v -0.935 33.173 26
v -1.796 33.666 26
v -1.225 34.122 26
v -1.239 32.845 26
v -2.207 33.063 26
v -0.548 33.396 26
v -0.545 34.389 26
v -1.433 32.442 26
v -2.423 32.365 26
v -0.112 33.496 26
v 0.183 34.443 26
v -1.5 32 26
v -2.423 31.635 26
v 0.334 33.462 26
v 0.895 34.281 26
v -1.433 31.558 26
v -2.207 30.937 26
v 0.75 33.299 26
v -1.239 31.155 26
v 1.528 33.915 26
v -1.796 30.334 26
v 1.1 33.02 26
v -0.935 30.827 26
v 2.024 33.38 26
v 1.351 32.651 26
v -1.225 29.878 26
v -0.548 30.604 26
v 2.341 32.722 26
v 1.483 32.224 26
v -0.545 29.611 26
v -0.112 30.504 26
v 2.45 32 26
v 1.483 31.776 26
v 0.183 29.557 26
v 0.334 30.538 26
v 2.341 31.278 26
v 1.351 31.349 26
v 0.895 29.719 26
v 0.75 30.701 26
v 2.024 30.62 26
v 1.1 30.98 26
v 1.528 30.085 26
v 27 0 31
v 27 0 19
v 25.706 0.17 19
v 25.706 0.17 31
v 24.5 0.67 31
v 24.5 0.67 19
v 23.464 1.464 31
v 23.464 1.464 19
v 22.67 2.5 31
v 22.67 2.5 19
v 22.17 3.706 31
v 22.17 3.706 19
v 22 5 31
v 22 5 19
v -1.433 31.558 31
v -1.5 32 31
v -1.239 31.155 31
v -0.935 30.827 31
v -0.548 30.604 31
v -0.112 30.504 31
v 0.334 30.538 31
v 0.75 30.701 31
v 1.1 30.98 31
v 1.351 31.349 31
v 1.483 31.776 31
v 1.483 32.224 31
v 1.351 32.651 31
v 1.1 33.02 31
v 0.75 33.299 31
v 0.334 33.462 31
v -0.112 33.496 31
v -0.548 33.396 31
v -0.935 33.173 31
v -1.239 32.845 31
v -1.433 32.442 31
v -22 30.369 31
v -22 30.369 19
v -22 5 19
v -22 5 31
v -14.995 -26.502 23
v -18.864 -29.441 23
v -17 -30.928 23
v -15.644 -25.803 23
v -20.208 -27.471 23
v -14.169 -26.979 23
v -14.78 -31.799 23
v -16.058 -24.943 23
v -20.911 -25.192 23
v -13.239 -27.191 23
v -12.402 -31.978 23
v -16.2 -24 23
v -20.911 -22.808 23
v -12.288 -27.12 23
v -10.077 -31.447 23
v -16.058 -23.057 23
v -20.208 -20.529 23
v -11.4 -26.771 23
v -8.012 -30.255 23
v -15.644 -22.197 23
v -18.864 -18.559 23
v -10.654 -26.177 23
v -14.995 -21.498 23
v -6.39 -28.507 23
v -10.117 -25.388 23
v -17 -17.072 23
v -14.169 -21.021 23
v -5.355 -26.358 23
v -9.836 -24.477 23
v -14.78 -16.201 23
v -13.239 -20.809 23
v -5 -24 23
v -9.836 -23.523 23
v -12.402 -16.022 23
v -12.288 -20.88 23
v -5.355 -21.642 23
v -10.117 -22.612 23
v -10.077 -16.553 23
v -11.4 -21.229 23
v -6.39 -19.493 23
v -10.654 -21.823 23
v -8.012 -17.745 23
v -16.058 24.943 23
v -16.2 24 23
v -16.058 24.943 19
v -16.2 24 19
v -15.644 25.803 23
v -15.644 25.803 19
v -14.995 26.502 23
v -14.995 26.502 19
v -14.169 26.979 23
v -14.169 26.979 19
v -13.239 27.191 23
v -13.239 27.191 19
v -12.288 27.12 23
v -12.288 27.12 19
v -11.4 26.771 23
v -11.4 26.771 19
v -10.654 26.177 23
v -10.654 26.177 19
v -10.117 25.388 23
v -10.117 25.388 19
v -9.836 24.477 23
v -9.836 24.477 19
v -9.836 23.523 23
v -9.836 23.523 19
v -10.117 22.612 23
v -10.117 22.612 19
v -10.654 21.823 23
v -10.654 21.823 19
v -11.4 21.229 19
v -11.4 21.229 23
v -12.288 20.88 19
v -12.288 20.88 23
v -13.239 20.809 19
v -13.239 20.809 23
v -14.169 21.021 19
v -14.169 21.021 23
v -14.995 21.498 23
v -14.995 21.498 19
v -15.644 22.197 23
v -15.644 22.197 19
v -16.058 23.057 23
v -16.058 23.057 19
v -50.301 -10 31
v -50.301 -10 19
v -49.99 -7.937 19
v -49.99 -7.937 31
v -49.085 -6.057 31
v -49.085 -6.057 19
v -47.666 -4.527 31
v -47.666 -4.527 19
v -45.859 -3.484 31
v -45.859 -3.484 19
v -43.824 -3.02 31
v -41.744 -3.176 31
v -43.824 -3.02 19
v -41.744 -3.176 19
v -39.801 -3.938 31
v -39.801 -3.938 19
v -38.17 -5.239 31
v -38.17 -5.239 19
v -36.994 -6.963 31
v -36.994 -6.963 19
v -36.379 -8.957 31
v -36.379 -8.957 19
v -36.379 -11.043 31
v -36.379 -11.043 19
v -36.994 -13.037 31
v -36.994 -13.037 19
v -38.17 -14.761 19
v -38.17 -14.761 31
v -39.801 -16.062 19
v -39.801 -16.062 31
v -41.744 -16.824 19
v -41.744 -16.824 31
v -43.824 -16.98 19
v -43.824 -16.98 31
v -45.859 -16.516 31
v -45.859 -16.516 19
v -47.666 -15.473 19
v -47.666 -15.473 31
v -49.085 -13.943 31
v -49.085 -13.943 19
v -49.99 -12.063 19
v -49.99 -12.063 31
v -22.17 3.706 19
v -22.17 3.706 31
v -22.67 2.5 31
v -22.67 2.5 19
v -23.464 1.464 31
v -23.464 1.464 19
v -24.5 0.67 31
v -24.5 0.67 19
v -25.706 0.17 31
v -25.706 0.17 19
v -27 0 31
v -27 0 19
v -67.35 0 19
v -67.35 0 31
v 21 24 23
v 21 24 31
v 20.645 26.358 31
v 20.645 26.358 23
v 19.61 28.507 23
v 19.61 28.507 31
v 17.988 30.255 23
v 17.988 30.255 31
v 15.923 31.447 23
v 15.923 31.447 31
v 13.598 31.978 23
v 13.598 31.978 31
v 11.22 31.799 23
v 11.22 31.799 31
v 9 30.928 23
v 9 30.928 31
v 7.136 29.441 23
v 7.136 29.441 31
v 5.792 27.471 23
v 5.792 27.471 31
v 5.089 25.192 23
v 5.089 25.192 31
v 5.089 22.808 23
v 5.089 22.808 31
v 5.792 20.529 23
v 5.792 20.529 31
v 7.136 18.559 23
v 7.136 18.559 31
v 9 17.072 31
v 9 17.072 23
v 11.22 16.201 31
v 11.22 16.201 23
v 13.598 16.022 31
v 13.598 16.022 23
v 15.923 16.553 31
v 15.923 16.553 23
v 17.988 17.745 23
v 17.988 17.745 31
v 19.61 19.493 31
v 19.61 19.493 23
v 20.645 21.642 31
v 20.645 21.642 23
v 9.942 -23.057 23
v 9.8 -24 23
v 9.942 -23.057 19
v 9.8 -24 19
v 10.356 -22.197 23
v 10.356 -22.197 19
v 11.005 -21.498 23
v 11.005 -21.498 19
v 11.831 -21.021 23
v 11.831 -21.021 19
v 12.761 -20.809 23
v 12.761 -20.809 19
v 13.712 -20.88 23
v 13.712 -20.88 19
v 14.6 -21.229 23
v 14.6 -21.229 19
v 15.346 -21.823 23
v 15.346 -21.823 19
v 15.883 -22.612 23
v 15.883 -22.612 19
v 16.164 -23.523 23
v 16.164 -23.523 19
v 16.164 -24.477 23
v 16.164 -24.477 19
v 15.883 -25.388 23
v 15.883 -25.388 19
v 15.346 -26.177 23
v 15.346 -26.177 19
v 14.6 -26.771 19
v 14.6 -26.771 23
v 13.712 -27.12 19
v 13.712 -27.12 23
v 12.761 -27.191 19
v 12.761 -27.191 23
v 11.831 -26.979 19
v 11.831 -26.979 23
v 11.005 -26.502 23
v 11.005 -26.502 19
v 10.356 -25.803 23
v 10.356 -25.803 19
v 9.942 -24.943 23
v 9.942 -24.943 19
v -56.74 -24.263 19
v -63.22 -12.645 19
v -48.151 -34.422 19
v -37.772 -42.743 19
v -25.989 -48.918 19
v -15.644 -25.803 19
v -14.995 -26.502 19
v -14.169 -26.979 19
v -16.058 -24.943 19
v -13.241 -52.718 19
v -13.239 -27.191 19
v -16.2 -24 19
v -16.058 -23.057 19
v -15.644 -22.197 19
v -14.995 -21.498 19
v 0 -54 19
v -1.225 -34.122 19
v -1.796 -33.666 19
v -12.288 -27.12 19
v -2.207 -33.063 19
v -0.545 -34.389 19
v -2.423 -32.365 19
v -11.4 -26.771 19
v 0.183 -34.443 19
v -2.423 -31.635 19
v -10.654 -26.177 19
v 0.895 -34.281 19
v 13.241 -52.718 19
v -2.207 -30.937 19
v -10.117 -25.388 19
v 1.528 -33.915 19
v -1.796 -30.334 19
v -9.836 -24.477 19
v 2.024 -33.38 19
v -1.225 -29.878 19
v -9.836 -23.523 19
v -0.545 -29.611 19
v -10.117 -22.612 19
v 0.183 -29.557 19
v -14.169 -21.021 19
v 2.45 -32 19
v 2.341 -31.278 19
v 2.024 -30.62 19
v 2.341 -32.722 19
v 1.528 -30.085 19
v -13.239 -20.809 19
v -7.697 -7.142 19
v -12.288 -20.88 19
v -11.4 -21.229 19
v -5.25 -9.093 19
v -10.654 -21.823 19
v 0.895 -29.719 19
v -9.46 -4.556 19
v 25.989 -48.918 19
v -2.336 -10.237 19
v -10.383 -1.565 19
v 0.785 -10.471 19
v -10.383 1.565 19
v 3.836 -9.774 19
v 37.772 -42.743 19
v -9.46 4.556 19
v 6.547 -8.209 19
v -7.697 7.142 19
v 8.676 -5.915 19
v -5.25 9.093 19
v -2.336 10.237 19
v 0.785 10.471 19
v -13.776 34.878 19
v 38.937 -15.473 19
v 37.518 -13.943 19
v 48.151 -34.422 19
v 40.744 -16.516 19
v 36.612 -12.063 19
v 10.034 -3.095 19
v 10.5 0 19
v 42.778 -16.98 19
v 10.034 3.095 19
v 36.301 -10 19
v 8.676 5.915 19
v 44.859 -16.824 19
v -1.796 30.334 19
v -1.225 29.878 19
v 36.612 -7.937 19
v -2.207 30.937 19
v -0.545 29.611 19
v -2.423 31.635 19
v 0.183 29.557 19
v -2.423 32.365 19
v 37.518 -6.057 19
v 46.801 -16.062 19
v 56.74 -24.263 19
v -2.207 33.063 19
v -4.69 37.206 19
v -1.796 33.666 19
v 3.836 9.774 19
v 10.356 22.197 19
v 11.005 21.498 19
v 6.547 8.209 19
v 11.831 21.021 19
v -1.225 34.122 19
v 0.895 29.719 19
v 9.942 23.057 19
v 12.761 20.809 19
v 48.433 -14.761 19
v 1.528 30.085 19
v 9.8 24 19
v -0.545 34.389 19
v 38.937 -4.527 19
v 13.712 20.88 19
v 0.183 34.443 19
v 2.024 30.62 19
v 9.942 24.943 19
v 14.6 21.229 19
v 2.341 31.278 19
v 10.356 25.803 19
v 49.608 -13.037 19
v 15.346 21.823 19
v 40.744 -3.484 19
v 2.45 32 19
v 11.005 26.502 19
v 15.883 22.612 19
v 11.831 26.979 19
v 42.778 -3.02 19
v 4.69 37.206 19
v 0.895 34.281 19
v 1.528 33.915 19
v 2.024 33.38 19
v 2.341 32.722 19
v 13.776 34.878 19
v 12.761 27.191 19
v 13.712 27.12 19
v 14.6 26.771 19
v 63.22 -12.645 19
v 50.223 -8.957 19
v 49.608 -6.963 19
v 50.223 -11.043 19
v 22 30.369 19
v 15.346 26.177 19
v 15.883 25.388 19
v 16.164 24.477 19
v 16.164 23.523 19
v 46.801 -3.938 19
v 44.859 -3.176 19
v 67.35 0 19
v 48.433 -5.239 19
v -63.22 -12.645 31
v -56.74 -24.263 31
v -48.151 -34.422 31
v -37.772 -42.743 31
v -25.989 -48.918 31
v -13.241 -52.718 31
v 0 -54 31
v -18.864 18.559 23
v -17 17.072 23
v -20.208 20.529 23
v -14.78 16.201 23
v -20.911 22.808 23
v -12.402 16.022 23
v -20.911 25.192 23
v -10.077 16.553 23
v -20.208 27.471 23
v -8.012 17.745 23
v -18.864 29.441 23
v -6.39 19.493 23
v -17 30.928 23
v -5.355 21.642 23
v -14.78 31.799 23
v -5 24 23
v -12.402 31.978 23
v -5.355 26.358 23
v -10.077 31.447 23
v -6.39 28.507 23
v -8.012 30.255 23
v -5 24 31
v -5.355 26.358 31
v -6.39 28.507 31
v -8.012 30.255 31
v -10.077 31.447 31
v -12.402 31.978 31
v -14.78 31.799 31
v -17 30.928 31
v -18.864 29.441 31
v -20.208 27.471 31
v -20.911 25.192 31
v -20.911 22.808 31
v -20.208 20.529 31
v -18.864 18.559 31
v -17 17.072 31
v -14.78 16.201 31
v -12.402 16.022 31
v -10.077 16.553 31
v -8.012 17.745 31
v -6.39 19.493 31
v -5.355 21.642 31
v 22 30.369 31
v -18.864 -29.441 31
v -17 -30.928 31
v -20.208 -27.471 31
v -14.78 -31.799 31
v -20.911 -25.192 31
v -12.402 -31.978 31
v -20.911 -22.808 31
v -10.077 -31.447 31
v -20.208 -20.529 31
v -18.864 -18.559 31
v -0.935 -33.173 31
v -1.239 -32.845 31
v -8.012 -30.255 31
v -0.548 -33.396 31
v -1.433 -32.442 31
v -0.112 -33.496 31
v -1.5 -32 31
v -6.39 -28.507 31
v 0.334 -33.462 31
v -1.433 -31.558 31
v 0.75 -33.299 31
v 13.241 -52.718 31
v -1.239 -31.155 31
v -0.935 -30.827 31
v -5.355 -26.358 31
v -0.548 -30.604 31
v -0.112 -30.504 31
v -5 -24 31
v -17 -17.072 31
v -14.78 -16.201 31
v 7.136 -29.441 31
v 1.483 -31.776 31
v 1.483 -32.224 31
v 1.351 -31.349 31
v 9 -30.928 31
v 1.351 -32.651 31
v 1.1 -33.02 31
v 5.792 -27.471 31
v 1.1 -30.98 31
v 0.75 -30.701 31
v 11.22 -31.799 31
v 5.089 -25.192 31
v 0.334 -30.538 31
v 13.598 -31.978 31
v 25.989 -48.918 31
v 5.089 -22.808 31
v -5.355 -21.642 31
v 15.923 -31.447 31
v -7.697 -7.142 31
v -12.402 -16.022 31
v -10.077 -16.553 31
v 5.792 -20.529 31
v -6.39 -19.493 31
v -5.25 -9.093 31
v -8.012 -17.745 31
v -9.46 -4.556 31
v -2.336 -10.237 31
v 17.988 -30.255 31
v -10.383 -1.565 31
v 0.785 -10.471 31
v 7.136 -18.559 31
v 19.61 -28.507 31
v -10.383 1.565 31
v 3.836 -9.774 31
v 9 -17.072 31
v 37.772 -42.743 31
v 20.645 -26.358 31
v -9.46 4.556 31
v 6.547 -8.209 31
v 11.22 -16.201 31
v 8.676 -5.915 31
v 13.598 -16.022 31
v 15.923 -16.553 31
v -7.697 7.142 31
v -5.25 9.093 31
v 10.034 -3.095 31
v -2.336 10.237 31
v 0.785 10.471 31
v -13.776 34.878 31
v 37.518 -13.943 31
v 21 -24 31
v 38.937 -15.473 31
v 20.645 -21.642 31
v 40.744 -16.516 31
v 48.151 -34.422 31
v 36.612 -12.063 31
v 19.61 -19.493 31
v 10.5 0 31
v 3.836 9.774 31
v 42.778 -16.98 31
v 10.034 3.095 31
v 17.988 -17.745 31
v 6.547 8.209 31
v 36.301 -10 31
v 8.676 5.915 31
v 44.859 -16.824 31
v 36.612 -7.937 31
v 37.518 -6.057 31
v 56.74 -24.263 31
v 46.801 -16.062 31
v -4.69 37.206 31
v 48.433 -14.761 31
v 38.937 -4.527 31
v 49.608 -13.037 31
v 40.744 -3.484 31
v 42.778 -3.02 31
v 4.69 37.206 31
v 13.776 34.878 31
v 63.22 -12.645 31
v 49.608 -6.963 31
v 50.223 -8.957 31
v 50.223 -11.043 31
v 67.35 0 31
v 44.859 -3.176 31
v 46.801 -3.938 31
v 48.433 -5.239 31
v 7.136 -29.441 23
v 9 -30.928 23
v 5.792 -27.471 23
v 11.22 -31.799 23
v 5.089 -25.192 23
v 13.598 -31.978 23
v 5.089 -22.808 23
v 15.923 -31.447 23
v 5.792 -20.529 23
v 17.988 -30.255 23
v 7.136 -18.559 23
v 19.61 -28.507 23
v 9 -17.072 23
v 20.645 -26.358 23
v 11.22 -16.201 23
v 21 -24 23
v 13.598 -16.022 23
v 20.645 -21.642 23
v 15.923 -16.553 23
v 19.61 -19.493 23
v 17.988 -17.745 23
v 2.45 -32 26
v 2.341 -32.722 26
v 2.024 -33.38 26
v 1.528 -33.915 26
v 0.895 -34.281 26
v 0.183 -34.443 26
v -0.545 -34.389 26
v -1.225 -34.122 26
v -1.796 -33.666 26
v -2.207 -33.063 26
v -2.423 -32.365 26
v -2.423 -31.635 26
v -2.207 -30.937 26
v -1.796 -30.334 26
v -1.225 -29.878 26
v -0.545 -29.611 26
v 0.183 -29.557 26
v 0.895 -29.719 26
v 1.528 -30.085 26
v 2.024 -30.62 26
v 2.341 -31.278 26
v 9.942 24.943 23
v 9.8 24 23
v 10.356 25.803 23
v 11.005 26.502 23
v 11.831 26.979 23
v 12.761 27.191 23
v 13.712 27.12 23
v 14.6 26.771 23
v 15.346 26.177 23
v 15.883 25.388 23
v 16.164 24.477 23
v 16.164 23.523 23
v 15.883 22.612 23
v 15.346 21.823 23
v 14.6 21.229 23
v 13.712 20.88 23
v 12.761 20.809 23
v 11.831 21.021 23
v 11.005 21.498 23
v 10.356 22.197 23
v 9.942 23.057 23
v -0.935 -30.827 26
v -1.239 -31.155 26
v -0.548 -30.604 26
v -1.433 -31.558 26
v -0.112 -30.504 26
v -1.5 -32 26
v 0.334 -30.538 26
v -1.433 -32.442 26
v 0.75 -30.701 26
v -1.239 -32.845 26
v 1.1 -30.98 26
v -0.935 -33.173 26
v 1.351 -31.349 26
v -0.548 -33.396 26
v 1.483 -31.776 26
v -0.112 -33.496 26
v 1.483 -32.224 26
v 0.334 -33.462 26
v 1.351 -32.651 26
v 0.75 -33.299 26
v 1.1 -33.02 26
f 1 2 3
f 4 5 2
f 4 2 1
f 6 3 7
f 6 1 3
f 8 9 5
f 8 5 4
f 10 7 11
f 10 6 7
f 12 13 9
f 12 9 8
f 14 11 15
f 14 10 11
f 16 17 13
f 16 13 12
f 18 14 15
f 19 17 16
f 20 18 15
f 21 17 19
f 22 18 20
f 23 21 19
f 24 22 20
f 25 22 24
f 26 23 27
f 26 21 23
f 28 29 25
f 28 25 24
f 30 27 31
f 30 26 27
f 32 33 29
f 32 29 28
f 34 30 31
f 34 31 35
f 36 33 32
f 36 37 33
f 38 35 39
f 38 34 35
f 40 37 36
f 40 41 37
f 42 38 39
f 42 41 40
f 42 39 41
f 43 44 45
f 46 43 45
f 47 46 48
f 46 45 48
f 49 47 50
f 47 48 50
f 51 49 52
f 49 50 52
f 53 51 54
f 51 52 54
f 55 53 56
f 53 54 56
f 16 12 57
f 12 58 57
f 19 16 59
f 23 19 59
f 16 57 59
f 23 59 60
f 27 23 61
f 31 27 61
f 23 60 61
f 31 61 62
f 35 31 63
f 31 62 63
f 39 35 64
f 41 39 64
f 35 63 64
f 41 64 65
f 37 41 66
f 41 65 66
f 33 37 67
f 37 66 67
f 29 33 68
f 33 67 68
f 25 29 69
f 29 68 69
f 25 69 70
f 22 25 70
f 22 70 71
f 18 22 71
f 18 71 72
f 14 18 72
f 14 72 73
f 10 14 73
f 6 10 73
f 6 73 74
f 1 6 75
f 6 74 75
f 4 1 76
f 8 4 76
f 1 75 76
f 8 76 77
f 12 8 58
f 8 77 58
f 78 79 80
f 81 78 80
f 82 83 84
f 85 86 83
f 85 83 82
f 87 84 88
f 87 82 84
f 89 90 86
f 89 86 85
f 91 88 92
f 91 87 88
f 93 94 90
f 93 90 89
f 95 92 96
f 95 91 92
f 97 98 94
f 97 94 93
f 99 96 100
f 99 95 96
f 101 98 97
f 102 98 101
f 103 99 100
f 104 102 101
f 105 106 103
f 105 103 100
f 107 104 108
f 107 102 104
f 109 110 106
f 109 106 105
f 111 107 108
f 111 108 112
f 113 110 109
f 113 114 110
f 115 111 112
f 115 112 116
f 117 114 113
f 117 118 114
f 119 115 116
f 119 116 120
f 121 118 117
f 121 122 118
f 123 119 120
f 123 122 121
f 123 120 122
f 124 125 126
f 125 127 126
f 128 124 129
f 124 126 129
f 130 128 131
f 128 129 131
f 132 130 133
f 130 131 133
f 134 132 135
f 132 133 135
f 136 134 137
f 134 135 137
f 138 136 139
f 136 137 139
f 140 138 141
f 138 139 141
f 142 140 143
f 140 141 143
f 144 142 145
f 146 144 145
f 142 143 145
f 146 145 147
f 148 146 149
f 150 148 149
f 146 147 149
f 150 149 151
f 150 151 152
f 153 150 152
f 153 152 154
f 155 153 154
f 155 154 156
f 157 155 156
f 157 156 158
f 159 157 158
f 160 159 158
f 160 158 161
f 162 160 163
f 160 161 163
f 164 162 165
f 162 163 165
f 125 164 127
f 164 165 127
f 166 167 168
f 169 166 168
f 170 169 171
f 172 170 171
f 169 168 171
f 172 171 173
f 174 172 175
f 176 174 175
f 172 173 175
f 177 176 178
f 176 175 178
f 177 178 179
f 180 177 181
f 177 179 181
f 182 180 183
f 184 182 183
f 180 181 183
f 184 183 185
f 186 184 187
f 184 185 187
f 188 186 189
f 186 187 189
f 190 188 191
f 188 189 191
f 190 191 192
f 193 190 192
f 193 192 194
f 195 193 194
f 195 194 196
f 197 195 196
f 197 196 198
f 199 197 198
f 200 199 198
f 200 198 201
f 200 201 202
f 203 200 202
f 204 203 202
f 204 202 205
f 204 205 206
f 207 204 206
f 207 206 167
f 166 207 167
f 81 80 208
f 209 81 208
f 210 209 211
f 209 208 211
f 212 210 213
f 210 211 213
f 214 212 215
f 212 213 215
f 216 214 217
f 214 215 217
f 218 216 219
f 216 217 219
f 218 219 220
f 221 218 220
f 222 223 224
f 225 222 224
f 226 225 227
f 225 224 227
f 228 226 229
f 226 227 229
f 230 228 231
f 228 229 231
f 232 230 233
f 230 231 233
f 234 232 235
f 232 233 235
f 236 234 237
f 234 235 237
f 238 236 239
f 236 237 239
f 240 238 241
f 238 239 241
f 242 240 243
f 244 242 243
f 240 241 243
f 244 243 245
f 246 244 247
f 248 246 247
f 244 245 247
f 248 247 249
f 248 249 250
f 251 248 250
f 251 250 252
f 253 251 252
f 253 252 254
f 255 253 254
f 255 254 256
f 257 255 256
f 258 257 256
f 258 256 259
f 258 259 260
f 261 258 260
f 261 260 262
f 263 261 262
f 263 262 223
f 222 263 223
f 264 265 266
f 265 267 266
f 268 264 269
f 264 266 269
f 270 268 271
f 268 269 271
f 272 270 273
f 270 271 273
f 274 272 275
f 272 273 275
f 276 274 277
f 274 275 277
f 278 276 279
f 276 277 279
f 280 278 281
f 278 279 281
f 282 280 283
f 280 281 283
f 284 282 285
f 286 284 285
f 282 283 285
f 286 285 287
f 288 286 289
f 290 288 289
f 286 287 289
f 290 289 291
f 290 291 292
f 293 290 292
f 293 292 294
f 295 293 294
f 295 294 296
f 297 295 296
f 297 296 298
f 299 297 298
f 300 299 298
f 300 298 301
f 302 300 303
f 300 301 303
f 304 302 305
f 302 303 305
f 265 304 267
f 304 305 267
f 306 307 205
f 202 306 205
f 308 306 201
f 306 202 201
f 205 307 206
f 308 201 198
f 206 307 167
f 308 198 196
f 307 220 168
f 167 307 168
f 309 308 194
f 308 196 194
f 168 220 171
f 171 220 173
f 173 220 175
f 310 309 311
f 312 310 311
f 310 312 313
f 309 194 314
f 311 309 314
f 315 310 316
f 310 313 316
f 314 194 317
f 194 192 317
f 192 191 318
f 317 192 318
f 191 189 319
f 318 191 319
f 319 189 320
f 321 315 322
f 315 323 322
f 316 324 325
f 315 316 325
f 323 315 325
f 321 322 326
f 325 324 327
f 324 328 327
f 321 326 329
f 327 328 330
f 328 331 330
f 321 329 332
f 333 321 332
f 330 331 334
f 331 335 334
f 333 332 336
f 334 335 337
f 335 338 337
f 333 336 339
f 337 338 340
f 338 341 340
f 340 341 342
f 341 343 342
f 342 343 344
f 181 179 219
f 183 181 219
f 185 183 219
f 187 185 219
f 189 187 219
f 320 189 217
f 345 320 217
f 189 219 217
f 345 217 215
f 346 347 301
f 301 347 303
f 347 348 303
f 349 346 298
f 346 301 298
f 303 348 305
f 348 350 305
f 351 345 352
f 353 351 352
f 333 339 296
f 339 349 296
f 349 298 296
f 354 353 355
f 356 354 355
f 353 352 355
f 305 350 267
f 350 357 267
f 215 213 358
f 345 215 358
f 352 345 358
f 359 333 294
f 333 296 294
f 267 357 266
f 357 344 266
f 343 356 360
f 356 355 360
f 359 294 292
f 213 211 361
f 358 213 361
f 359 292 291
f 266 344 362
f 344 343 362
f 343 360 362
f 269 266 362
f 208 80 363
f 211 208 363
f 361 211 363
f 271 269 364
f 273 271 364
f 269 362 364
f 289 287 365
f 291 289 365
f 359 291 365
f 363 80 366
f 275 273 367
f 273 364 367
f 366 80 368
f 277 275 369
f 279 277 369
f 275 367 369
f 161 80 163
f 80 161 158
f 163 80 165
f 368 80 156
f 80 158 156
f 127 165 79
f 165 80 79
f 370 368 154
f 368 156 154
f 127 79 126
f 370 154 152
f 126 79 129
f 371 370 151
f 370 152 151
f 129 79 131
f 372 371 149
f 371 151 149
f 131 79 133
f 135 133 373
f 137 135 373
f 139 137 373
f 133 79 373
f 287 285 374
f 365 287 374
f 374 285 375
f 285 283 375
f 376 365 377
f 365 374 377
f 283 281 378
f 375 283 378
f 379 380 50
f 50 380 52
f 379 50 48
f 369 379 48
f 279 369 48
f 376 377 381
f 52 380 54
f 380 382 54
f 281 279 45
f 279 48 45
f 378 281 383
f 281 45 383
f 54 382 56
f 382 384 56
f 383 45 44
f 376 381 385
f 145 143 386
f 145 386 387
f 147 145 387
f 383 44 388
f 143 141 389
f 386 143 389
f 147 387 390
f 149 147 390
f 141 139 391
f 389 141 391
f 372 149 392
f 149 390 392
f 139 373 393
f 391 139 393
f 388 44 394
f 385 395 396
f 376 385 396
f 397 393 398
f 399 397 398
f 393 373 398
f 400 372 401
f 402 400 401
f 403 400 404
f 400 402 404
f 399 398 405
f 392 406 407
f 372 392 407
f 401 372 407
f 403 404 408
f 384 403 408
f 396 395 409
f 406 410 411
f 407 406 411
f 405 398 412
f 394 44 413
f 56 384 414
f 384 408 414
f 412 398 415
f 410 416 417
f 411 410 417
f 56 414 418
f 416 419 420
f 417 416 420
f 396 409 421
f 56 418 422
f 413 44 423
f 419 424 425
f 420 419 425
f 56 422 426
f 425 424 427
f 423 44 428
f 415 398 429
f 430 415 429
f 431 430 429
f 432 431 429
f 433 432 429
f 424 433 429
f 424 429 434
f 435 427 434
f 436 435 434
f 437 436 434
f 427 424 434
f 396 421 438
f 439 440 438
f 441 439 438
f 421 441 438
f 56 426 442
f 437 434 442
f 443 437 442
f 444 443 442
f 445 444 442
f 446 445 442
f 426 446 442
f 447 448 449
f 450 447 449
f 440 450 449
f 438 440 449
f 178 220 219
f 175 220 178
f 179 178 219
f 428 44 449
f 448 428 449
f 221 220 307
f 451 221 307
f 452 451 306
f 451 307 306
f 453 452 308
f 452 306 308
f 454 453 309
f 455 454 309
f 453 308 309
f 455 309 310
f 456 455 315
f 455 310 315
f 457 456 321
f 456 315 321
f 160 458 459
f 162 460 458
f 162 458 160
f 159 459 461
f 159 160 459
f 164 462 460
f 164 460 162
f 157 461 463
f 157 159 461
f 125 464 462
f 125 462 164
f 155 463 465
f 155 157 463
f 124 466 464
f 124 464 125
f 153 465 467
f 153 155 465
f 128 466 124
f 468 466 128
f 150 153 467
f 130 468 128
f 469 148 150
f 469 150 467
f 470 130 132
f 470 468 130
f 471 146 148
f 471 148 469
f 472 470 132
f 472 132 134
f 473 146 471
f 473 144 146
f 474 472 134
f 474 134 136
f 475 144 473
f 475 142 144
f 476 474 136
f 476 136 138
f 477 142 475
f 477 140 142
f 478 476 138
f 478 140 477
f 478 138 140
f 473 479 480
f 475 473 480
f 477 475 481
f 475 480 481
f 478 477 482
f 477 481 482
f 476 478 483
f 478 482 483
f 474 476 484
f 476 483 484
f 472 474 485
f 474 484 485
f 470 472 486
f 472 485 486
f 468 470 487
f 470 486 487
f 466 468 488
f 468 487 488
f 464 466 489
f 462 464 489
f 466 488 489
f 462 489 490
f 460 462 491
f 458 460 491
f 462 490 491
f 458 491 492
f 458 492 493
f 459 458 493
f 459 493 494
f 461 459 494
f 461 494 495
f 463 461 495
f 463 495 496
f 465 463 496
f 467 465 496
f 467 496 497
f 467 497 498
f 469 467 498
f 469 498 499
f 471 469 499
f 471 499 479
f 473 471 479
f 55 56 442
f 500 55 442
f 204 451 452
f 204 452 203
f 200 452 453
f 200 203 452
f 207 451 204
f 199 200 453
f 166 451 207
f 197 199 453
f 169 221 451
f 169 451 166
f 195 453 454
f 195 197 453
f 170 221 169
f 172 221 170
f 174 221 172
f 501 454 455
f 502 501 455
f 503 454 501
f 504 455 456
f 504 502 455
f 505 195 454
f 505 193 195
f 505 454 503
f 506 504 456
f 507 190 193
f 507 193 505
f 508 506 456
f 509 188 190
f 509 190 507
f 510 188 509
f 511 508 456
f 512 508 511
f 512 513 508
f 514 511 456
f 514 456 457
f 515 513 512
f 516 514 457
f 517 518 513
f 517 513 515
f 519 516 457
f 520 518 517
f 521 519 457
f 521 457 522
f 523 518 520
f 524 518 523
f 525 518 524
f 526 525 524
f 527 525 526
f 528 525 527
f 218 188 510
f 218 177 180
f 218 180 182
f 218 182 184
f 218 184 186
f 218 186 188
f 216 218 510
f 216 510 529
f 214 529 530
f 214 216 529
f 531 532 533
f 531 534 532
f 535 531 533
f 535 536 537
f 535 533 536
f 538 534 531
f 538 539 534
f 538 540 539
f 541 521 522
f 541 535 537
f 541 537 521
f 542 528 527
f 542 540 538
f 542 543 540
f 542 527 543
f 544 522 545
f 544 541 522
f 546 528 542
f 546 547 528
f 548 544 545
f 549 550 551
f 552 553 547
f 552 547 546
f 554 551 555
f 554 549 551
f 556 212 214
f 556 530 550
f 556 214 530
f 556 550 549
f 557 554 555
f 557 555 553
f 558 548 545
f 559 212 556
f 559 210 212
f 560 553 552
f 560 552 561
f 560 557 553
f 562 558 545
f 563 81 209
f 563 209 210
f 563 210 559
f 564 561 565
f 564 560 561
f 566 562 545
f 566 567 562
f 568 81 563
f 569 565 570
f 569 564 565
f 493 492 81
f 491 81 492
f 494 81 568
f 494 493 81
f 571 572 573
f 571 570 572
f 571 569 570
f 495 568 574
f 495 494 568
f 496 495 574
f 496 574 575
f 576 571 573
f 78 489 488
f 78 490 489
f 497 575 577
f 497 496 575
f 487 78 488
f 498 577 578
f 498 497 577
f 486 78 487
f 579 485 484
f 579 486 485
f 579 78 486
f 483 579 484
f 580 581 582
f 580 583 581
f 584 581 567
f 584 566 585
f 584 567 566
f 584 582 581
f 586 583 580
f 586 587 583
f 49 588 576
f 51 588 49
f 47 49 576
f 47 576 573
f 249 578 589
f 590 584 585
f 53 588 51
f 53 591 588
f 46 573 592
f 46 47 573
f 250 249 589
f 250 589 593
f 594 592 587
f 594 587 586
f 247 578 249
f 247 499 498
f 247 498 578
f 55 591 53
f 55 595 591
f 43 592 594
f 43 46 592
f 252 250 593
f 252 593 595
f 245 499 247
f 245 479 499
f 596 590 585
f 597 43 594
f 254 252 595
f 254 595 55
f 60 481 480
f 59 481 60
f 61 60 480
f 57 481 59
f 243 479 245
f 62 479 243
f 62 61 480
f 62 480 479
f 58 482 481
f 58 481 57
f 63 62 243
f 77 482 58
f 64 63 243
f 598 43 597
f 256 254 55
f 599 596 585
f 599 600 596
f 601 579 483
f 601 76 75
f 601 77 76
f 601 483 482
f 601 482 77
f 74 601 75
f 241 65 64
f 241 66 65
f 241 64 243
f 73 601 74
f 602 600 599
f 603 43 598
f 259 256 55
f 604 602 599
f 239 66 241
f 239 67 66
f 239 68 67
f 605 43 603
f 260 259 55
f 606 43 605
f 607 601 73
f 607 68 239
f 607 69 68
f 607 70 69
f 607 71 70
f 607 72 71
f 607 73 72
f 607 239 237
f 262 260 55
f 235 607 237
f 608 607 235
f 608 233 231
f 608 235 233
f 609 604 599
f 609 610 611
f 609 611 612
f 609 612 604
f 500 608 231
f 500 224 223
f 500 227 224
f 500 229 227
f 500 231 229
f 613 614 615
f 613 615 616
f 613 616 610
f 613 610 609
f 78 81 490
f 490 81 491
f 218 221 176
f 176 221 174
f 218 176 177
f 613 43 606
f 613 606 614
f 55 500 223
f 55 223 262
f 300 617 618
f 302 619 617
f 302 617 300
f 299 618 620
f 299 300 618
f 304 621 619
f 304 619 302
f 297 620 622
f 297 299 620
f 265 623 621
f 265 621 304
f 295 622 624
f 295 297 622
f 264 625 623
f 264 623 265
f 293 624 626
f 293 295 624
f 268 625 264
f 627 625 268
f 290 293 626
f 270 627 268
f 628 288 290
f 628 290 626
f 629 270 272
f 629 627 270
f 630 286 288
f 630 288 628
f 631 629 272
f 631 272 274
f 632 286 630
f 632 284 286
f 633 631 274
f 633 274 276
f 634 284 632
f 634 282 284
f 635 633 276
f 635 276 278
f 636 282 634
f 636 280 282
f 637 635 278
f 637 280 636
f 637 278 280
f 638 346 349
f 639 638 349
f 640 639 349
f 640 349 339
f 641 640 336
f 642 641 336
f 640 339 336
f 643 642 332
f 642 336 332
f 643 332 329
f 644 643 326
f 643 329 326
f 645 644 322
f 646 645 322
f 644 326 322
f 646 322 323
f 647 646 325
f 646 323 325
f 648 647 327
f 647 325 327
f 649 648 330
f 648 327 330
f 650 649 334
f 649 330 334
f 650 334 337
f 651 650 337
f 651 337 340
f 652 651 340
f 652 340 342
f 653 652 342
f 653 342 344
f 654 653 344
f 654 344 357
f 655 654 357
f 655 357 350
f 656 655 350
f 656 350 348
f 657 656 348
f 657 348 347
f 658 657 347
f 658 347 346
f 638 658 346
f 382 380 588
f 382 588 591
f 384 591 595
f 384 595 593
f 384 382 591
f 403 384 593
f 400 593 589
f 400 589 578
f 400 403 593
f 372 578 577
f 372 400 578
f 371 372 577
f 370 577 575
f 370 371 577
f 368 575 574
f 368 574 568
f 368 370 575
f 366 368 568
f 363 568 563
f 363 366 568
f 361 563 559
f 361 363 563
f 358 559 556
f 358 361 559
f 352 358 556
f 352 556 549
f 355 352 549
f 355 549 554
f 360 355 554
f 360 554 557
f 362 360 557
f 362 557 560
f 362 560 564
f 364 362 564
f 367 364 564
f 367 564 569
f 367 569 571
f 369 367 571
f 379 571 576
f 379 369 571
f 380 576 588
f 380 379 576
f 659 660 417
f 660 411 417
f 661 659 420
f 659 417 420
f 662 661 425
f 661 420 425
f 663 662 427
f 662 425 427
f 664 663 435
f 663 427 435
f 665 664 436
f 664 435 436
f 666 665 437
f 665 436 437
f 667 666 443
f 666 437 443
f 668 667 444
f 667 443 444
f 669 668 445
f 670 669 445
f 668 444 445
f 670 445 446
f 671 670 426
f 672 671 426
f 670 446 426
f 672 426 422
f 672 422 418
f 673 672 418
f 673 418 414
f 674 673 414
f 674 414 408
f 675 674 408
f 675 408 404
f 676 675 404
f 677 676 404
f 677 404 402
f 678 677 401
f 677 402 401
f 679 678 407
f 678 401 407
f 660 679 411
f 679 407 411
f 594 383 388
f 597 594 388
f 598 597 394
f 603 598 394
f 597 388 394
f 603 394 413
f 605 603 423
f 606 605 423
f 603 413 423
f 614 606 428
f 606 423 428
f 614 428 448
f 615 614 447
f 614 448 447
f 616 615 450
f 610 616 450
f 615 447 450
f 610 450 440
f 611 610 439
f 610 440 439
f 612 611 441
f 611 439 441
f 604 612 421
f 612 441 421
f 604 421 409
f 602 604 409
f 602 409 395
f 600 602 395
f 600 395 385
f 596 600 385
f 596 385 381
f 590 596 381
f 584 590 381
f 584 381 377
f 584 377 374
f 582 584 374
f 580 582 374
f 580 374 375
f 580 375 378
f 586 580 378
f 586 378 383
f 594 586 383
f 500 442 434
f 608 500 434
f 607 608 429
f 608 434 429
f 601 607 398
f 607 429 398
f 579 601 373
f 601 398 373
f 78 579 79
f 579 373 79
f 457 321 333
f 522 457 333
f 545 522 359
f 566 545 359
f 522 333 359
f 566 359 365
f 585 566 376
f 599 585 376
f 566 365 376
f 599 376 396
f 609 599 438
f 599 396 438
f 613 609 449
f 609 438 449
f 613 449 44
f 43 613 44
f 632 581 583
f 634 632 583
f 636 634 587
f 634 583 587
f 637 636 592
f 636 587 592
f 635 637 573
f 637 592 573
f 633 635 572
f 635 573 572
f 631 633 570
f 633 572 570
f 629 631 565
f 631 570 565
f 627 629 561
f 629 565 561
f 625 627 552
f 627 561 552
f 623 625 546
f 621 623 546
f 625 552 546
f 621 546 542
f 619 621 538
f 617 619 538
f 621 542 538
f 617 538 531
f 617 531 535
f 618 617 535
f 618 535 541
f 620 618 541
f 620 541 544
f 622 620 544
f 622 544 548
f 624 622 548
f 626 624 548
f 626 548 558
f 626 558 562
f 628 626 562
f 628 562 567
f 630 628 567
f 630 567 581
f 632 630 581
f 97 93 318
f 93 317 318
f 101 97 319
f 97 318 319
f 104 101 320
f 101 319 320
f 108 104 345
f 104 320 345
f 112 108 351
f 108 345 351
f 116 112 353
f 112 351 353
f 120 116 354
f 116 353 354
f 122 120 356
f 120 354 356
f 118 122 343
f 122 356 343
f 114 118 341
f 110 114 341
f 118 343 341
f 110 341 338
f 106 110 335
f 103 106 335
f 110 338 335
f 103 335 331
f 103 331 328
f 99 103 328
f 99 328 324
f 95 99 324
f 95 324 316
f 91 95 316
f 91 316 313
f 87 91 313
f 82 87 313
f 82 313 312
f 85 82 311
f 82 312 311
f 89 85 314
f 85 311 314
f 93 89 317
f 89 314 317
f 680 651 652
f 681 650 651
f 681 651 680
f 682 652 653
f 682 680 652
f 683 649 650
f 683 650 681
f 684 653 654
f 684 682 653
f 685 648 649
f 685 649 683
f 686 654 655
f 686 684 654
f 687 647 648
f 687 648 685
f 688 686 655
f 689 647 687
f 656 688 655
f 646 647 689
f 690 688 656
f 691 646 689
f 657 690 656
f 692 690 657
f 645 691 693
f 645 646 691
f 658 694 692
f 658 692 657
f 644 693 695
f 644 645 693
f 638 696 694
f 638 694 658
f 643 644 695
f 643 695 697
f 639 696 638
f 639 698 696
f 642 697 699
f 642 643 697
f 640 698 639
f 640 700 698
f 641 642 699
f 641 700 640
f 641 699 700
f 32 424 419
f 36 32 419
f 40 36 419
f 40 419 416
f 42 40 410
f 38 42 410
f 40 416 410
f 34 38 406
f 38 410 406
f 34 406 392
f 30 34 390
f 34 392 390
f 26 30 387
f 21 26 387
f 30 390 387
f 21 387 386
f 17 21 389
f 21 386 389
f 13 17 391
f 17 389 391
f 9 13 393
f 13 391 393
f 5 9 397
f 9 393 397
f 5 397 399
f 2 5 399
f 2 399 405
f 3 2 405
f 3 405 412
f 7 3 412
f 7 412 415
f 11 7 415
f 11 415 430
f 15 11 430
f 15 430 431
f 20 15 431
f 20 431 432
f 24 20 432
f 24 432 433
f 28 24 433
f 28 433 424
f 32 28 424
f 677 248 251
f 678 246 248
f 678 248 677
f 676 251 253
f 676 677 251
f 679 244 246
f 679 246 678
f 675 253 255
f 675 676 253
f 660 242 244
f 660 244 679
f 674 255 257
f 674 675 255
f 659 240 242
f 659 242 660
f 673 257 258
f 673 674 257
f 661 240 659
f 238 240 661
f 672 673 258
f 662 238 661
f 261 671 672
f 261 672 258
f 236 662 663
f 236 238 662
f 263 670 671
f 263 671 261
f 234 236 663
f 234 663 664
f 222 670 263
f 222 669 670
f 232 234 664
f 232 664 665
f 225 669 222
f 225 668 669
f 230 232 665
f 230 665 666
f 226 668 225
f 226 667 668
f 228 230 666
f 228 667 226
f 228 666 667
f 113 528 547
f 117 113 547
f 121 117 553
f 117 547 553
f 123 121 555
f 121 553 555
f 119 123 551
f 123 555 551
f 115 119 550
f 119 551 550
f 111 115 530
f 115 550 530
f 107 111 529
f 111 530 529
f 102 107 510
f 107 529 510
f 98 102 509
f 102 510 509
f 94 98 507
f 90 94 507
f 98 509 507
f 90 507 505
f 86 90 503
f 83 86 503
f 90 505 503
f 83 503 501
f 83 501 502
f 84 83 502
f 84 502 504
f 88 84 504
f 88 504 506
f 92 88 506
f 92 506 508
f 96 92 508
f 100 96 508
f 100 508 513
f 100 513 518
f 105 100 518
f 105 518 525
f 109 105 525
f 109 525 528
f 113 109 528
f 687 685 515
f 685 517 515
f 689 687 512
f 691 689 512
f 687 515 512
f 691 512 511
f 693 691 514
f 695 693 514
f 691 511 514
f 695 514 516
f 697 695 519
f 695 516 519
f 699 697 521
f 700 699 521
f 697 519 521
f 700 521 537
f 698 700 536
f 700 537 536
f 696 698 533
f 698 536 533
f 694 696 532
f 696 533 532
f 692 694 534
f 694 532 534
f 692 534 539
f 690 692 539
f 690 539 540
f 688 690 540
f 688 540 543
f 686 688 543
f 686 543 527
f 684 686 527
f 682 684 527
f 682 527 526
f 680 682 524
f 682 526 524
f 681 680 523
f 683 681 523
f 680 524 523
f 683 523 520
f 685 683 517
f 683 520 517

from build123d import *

# Parameters (mm, degrees)
F1_R           = 10.5
F2_DEPTH       = 12
F6_D           = 6.4
F6_CBORE_D     = 16
F6_CBORE_DEPTH = 8
F7_D           = 14
F9_D           = 3
F9_CBORE_D     = 4.9
F9_CBORE_DEPTH = 7


with BuildPart() as f2:
    # F1 (on offset) → F2 (new body)
    with BuildSketch(Plane.XY.offset(19)):
        with BuildLine():
            ThreePointArc((22, 30.3685692781), (0, 37.5), (-22, 30.3685692781))
            Line((-22, 30.3685692781), (-22, 5))
            ThreePointArc((-22, 5), (-23.4644660941, 1.4644660941), (-27, 0))
            Line((-27, 0), (-67.3498329619, 0))
            ThreePointArc((-67.3498329619, 0), (-43.1624837098, -38.8330753348), (0, -54))
            ThreePointArc((0, -54), (43.1624837098, -38.8330753348), (67.3498329619, 0))
            Line((67.3498329619, 0), (27, 0))
            ThreePointArc((27, 0), (23.4644660941, 1.4644660941), (22, 5))
            Line((22, 5), (22, 30.3685692781))
        make_face()
        Circle(F1_R, mode=Mode.SUBTRACT)
    extrude(amount=F2_DEPTH)

    # F6 (through all)
    with Locations(Plane.XY.offset(31)):
        with Locations((-13, 24), (13, 24), (-13, -24), (13, -24)):
            CounterBoreHole(F6_D / 2, F6_CBORE_D / 2, F6_CBORE_DEPTH)

    # F7 (through all)
    with Locations(Plane.XY.offset(31)):
        with Locations((-43.3012701892, -10), (43.3012701892, -10)):
            Hole(F7_D / 2)

    # F9 (through all)
    with Locations(Plane(origin=(0, 0, 19), x_dir=(1, 0, 0), z_dir=(0, 0, -1))):
        with Locations((0, 32), (0, -32)):
            CounterBoreHole(F9_D / 2, F9_CBORE_D / 2, F9_CBORE_DEPTH)


solid = f2.part
